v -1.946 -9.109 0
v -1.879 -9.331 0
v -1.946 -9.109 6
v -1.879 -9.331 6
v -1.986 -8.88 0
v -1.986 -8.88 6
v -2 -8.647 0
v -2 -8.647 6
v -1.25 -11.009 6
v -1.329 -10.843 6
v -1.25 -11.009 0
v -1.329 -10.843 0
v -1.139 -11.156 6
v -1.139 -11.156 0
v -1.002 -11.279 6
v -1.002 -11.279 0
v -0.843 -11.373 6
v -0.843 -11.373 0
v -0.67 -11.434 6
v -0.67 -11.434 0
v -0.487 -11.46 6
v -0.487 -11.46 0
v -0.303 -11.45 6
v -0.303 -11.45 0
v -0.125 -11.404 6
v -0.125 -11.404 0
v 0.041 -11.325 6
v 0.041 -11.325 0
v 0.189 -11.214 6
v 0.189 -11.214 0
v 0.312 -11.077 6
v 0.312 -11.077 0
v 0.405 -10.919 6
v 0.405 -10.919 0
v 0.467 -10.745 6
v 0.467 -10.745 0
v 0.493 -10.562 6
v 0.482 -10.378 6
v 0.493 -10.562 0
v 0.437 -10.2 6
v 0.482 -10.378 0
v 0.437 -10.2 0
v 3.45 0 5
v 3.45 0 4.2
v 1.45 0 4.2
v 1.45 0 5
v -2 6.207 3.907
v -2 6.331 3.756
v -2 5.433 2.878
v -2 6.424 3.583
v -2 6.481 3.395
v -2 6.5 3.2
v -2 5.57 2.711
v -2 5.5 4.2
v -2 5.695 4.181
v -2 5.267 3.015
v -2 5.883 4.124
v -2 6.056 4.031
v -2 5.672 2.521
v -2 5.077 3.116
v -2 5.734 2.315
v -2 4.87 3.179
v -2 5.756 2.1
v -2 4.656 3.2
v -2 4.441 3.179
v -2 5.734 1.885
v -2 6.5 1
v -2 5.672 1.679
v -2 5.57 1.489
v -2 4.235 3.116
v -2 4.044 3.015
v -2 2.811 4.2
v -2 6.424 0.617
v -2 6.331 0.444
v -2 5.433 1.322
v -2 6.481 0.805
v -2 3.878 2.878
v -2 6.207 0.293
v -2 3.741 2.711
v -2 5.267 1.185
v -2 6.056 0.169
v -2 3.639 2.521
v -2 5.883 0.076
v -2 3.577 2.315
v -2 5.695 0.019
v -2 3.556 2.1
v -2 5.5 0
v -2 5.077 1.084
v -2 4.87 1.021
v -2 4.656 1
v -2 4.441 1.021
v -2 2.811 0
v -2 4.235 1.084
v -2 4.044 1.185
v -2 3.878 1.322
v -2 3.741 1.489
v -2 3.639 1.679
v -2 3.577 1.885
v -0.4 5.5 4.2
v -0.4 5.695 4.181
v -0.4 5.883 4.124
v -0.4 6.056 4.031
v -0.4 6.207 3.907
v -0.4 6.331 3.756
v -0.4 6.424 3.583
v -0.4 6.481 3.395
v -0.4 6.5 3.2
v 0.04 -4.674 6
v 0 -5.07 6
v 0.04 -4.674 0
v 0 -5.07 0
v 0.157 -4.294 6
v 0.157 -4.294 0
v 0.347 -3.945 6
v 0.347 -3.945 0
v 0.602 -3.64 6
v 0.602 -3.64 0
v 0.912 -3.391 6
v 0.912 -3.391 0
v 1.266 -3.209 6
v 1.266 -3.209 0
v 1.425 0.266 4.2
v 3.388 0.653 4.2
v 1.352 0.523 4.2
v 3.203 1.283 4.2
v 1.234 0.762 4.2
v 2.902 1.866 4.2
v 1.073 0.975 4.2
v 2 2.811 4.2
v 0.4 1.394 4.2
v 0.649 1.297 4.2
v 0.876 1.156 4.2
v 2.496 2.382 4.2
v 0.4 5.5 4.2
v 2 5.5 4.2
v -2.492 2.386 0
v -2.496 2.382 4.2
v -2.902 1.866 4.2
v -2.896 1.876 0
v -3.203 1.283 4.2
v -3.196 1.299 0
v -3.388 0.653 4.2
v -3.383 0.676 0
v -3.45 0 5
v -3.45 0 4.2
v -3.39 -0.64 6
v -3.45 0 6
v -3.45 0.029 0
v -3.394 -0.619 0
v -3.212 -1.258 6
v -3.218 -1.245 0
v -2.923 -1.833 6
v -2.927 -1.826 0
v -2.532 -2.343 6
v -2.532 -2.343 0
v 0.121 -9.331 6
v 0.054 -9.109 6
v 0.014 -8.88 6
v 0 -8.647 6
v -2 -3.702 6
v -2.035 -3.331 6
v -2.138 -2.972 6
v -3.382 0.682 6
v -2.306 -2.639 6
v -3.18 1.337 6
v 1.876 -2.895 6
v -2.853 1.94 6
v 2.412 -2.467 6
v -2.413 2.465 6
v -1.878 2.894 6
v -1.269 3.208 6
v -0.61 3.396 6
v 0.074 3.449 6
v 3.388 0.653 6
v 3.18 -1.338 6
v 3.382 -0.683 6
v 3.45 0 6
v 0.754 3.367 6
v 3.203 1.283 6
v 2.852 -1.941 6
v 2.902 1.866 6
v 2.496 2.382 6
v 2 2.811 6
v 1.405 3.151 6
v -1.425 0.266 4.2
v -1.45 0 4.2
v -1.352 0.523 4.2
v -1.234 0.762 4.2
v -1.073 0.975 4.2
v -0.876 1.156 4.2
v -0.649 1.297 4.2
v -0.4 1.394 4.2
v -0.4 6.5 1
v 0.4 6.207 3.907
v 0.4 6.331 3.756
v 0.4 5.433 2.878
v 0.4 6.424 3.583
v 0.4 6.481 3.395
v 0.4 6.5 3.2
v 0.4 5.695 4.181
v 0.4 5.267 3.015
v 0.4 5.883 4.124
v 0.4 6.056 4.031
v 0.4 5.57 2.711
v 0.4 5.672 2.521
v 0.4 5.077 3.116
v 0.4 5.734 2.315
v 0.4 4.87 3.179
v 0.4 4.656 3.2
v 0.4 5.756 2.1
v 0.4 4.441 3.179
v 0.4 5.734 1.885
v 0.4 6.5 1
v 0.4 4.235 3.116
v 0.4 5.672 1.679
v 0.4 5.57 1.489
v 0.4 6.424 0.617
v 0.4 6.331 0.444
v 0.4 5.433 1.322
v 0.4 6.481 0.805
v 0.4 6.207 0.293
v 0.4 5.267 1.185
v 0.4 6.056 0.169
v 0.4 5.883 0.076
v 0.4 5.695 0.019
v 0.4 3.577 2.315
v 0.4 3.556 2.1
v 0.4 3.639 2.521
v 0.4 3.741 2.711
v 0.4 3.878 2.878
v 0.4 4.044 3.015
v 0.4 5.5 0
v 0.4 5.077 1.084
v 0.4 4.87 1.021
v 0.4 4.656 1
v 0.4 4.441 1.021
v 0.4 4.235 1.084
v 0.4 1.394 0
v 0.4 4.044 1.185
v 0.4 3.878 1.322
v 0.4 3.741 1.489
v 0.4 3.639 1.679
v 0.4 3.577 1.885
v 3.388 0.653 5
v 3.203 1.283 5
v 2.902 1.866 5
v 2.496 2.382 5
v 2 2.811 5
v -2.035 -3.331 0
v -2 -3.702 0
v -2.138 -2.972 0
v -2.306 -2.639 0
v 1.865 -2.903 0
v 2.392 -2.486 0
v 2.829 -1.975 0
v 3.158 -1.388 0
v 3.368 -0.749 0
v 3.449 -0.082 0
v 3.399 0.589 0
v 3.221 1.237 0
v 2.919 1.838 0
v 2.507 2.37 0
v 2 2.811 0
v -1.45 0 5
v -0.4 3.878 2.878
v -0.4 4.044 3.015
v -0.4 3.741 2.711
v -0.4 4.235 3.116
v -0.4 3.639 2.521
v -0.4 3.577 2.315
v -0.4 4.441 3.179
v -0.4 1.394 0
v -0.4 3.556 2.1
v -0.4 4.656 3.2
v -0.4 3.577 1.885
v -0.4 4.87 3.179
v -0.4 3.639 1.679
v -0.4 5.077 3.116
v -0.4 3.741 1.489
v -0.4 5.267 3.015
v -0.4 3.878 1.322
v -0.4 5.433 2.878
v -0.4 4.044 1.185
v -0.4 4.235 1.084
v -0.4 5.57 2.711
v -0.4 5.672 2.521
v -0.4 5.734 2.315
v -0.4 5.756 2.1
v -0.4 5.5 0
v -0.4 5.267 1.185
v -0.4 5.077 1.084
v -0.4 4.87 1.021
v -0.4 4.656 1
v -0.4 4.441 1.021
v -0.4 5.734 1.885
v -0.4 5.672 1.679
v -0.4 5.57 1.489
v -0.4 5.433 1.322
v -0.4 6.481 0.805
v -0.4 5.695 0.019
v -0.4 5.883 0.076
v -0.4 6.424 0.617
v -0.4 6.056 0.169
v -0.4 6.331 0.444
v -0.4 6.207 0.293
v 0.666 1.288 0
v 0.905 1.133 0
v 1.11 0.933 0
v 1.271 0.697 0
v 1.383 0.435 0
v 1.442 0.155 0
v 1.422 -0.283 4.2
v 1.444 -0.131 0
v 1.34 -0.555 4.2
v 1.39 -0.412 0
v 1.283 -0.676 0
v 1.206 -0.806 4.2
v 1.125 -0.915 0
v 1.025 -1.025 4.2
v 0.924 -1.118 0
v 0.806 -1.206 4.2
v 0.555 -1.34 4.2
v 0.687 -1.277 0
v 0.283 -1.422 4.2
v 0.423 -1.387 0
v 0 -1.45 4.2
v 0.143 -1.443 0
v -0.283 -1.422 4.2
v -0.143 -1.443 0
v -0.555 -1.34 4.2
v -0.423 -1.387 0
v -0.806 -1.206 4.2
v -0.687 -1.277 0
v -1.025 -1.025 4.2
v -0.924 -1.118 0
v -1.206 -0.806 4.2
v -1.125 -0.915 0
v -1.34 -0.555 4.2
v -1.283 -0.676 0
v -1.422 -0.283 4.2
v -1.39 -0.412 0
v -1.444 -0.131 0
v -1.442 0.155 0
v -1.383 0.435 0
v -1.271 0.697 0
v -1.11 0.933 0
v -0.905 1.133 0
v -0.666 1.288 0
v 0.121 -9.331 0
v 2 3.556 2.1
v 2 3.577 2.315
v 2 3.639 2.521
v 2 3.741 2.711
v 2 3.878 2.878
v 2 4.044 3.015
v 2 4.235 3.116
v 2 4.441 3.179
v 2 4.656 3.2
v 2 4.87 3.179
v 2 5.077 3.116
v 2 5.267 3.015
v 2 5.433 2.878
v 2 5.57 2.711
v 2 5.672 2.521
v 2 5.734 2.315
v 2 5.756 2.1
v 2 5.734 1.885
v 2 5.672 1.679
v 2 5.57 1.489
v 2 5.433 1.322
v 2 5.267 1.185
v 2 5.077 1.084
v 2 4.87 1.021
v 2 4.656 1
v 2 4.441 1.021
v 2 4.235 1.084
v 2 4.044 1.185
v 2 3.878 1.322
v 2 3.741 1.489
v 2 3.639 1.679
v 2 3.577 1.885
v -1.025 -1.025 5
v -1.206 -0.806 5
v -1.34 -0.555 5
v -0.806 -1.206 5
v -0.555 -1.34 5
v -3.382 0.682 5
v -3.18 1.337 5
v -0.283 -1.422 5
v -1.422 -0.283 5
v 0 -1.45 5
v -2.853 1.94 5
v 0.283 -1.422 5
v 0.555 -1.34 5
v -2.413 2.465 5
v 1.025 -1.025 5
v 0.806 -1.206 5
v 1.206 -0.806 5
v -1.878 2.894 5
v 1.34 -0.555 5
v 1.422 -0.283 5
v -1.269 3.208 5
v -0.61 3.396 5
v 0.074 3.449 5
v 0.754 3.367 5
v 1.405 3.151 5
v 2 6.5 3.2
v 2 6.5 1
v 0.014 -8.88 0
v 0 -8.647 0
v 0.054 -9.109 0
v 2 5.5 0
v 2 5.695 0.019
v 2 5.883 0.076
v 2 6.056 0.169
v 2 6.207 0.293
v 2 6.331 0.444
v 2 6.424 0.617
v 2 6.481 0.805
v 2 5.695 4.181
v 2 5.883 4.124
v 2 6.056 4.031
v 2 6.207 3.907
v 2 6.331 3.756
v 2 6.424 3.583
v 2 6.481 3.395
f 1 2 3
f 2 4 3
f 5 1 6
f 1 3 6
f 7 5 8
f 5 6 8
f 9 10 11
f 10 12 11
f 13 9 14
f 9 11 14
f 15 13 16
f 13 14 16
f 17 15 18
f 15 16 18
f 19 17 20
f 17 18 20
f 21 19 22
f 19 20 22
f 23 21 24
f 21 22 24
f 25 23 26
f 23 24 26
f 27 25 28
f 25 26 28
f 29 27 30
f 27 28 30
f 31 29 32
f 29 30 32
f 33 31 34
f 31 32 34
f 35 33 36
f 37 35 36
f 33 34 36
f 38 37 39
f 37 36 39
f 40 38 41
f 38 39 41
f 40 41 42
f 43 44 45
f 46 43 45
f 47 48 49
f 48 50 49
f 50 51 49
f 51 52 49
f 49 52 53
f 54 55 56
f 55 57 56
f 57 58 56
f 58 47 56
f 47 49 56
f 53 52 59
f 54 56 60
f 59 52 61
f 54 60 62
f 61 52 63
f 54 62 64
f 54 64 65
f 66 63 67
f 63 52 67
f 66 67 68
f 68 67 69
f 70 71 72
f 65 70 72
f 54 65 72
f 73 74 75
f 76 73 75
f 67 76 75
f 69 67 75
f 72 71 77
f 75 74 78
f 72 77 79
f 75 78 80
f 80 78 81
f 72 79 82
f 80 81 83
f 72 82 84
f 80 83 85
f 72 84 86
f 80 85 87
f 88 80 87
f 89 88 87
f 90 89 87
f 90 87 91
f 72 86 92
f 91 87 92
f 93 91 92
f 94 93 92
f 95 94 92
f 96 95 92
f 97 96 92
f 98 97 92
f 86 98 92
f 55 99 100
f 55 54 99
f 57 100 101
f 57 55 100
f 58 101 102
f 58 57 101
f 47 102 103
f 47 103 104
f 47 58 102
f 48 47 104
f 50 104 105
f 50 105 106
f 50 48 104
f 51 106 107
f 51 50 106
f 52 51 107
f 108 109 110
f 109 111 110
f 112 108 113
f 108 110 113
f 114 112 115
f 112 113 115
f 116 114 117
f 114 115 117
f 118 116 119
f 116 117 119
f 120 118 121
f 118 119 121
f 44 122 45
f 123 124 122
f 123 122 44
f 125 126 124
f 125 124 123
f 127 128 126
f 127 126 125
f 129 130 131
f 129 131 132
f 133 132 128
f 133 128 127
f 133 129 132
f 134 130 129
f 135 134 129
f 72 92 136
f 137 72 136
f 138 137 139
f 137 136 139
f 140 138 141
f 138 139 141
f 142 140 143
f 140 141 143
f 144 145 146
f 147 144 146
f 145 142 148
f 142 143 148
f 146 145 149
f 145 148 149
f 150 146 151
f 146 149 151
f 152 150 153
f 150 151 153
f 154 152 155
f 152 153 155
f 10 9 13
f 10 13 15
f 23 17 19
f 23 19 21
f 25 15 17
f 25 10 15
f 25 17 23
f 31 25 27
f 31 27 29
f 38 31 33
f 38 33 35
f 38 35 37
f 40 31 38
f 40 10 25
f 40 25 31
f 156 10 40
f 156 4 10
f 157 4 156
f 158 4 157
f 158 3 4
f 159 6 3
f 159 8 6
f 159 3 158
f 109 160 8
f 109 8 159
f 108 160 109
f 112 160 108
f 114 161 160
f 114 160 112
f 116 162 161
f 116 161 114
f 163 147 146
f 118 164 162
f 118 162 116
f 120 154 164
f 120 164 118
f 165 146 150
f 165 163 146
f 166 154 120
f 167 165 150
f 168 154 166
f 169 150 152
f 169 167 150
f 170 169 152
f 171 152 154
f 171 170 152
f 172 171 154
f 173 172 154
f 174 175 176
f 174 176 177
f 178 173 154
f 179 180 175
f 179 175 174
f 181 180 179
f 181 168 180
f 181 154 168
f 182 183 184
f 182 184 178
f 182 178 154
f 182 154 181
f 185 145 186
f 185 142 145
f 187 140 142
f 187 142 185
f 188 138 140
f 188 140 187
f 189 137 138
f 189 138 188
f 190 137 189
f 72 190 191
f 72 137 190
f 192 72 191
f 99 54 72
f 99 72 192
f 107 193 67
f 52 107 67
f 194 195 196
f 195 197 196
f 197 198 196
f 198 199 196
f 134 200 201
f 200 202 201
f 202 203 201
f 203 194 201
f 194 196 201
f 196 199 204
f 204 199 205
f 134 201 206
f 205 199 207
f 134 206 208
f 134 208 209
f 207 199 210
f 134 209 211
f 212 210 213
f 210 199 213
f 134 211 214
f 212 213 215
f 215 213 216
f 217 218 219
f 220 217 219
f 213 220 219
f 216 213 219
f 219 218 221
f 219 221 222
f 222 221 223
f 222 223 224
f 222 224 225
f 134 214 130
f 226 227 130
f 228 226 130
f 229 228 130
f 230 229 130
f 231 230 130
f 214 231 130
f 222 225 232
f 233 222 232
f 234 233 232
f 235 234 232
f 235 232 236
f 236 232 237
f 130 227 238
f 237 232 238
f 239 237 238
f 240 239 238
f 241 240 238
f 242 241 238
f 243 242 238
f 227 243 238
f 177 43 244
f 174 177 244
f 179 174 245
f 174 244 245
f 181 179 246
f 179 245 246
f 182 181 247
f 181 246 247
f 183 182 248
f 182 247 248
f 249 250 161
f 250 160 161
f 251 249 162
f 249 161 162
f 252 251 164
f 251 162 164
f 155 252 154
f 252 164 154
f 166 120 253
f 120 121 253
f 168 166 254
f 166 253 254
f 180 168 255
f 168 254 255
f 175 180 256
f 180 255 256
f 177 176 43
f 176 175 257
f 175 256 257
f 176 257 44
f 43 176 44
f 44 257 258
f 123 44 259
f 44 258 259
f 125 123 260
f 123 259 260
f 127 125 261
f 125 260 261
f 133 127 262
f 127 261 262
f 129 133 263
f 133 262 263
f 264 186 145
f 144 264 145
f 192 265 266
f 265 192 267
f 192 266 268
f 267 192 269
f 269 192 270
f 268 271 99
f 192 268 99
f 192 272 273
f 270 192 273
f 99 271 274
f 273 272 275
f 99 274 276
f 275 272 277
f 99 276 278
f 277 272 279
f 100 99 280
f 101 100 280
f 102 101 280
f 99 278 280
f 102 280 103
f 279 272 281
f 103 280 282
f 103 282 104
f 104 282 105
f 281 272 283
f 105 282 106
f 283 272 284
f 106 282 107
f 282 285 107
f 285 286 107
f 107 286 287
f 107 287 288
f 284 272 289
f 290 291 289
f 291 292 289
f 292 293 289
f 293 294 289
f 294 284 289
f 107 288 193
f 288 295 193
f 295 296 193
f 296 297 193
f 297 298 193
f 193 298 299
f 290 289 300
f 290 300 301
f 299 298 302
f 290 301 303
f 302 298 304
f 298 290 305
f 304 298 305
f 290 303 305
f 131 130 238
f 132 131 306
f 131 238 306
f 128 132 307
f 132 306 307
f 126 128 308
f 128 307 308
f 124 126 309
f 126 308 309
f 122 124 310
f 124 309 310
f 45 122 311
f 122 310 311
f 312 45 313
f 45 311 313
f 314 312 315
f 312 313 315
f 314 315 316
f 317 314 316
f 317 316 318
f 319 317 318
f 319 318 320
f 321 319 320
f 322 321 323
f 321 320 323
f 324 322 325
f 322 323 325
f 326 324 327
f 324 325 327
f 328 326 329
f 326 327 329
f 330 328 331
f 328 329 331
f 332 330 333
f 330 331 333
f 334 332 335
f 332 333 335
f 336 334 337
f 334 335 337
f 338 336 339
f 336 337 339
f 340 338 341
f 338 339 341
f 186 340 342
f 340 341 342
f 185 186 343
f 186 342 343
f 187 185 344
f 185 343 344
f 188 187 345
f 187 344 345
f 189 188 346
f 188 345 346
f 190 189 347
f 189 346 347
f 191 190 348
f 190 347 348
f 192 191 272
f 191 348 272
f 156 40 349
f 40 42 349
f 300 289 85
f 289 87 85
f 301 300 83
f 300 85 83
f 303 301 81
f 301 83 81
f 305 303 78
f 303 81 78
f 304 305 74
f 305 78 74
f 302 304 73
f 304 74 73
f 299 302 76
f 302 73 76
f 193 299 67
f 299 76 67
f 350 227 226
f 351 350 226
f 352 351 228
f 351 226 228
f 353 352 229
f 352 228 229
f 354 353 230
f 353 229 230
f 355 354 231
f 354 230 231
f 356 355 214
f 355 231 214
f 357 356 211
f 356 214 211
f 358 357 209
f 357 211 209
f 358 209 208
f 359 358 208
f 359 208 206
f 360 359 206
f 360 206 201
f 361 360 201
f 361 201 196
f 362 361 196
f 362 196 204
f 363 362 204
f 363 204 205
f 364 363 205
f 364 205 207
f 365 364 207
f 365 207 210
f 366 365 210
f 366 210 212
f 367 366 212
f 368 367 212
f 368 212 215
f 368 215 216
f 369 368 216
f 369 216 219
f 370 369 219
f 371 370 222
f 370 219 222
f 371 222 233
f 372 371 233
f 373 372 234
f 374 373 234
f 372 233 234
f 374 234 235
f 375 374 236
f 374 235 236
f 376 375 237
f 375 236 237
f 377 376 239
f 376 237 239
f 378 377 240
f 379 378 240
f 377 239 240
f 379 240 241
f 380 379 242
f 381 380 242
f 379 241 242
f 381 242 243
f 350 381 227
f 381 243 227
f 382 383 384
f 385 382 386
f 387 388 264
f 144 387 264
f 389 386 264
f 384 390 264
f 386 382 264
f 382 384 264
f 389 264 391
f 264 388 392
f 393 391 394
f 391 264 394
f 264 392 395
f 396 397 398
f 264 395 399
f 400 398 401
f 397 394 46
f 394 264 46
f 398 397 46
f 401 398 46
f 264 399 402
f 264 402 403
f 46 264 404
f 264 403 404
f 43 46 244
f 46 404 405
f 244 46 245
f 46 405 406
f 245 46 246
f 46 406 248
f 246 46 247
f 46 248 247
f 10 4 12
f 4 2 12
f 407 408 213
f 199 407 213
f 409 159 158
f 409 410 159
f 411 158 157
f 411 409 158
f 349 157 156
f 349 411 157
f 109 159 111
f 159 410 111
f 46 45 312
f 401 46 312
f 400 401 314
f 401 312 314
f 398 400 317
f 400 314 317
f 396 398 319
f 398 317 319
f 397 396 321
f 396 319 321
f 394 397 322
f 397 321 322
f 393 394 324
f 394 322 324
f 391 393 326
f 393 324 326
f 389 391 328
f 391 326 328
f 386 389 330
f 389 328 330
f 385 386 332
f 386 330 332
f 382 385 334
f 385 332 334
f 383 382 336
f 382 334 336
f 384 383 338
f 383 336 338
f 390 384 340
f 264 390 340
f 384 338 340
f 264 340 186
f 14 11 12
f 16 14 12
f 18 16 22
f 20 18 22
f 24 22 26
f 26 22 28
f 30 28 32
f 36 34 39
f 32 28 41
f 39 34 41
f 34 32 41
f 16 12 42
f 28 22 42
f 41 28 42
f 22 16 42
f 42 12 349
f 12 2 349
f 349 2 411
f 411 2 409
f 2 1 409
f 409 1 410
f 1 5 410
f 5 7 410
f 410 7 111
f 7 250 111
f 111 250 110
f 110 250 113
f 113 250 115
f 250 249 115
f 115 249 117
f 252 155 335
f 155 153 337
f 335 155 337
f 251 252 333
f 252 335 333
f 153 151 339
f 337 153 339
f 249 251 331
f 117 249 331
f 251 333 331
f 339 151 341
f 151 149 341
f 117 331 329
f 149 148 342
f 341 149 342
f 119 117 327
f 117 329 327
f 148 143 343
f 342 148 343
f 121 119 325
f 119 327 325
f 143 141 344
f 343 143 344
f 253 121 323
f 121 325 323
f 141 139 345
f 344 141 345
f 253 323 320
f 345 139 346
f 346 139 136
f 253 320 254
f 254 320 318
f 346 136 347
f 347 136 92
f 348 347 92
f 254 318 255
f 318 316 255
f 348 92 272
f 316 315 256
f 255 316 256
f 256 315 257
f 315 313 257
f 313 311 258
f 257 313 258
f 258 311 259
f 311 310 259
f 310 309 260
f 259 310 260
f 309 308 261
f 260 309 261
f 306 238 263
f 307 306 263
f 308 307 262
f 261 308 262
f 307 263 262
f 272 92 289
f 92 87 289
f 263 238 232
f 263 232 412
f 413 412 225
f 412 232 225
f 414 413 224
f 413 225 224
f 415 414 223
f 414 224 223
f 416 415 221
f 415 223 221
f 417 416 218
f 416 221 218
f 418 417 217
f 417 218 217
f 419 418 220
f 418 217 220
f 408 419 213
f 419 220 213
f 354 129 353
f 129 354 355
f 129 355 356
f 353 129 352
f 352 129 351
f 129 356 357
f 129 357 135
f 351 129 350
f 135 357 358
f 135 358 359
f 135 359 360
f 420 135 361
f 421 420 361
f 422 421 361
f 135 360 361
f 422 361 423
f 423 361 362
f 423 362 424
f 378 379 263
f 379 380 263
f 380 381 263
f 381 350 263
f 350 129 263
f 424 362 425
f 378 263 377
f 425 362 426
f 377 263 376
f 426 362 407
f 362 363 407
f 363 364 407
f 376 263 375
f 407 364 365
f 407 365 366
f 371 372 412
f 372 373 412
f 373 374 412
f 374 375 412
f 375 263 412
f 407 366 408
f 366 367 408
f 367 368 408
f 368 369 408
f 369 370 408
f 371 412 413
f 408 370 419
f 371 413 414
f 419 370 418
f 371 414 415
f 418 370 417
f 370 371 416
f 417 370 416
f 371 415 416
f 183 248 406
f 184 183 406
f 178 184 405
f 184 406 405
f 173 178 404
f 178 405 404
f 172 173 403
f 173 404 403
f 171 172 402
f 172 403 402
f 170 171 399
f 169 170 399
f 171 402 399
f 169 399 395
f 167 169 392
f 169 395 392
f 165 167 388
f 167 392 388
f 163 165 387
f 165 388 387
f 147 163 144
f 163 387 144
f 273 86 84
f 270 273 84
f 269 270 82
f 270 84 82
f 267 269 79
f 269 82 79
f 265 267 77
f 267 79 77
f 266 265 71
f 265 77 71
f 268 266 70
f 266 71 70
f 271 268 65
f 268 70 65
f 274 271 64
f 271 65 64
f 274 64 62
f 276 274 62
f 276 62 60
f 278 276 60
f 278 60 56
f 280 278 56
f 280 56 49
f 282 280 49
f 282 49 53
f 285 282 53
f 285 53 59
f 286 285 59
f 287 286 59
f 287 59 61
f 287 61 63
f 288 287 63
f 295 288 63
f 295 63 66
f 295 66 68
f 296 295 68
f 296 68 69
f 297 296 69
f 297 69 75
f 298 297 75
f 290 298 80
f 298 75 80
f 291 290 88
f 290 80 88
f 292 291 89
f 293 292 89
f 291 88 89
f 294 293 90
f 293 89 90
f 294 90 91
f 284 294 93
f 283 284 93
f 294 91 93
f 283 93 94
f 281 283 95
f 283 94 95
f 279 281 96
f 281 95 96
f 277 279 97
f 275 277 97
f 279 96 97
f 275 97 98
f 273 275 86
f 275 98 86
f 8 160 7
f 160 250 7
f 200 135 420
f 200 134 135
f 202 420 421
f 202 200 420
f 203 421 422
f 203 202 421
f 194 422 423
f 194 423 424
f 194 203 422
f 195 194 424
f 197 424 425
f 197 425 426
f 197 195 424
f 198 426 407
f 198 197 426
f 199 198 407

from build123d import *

# Parameters (mm, degrees)
BOSS_EXTRUDE1_DEPTH = 4.2
SKETCH2_R           = 1.1
CUT_EXTRUDE1_DEPTH  = 14.367834606
FILLET1_R           = 1
BOSS_EXTRUDE2_DEPTH = 0.8
BOSS_EXTRUDE3_DEPTH = 1
FILLET2_R           = 2


with BuildPart() as part:
    # Sketch1 → Boss-Extrude1 (new body)
    with BuildSketch(Plane.XY):
        with BuildLine():
            Line((0, -9), (0, -3.45))
            ThreePointArc((0, -3.45), (3.286405942, -1.049779017), (2, 2.811138559))
            Line((2, 2.811138559), (2, 6.5))
            Line((2, 6.5), (0.4, 6.5))
            Line((0.4, 6.5), (0.4, 1.393735986))
            ThreePointArc((0.4, 1.393735986), (0, -1.45), (-0.4, 1.393735986))
            Line((-0.4, 1.393735986), (-0.4, 6.5))
            Line((-0.4, 6.5), (-2, 6.5))
            Line((-2, 6.5), (-2, 2.811138559))
            ThreePointArc((-2, 2.811138559), (-3.45, 0), (-2, -2.811138559))
            Line((-2, -2.811138559), (-2, -9))
            Line((-2, -9), (-1.329280162, -10.84278761))
            ThreePointArc((-1.329280162, -10.84278761), (-0.124864136, -11.404416026), (0.436764281, -10.2))
            Line((0.436764281, -10.2), (0, -9))
        make_face()
    extrude(amount=BOSS_EXTRUDE1_DEPTH)

    # Sketch2 → Cut-Extrude1 (cut, through all)
    with BuildSketch(Plane.ZY.offset(2)):
        with Locations(Location((2.1, 4.65556928, 0), (0, 0, 270))):
            Circle(SKETCH2_R)
    extrude(amount=-CUT_EXTRUDE1_DEPTH, mode=Mode.SUBTRACT)

    # Fillet1
    fillet1_edges = [part.edges().sort_by_distance(p)[0] for p in [
        (-1.2, 6.5, 0),
        (1.2, 6.5, 0),
        (1.2, 6.5, 4.2),
        (-1.2, 6.5, 4.2),
    ]]
    fillet(fillet1_edges, radius=FILLET1_R)

    # Sketch3 → Boss-Extrude2 (add)
    with BuildSketch(Plane.XY.offset(4.2)):
        with BuildLine():
            Line((-1.45, 0), (-3.45, 0))
            ThreePointArc((-3.45, 0), (-3.066145789, -1.581534065), (-2, -2.811138559))
            Line((-2, -2.811138559), (-2, -9))
            Line((-2, -9), (-1.329280162, -10.84278761))
            ThreePointArc((-1.329280162, -10.84278761), (-0.124864136, -11.404416026), (0.436764281, -10.2))
            Line((0.436764281, -10.2), (0, -9))
            Line((0, -9), (0, -3.45))
            ThreePointArc((0, -3.45), (2.439518395, -2.439518395), (3.45, 0))
            Line((3.45, 0), (1.45, 0))
            ThreePointArc((1.45, 0), (0, -1.45), (-1.45, 0))
        make_face()
    extrude(amount=BOSS_EXTRUDE2_DEPTH)

    # Sketch4 → Boss-Extrude3 (add)
    with BuildSketch(Plane.XY.offset(5)):
        with BuildLine():
            ThreePointArc((1.45, 0), (1.158123482, 0.872496418), (0.4, 1.393735986))
            ThreePointArc((0.4, 1.393735986), (-0.872496418, 1.158123482), (-1.45, 0))
            ThreePointArc((-1.45, 0), (0, -1.45), (1.45, 0))
        make_face()
        with BuildLine():
            ThreePointArc((3.45, 0), (3.066145789, 1.581534065), (2, 2.811138559))
            ThreePointArc((2, 2.811138559), (-1.581534065, 3.066145789), (-3.45, 0))
            Line((-3.45, 0), (-1.45, 0))
            ThreePointArc((-1.45, 0), (-0.872496418, 1.158123482), (0.4, 1.393735986))
            ThreePointArc((0.4, 1.393735986), (1.158123482, 0.872496418), (1.45, 0))
            Line((1.45, 0), (3.45, 0))
        make_face()
        with BuildLine():
            ThreePointArc((0, -3.45), (2.439518395, -2.439518395), (3.45, 0))
            Line((3.45, 0), (1.45, 0))
            ThreePointArc((1.45, 0), (0, -1.45), (-1.45, 0))
            Line((-1.45, 0), (-3.45, 0))
            ThreePointArc((-3.45, 0), (-3.066145789, -1.581534065), (-2, -2.811138559))
            Line((-2, -2.811138559), (-2, -9))
            Line((-2, -9), (-1.329280162, -10.84278761))
            ThreePointArc((-1.329280162, -10.84278761), (-0.124864136, -11.404416026), (0.436764281, -10.2))
            Line((0.436764281, -10.2), (0, -9))
            Line((0, -9), (0, -3.45))
        make_face()
    extrude(amount=BOSS_EXTRUDE3_DEPTH)

    # Fillet2
    fillet2_edges = [part.edges().sort_by_distance(p)[0] for p in [
        (0, -3.45, 3),
        (0, -9, 3),
        (-2, -9, 3),
        (-2, -2.811138559, 3),
    ]]
    fillet(fillet2_edges, radius=FILLET2_R)


solid = part.part
